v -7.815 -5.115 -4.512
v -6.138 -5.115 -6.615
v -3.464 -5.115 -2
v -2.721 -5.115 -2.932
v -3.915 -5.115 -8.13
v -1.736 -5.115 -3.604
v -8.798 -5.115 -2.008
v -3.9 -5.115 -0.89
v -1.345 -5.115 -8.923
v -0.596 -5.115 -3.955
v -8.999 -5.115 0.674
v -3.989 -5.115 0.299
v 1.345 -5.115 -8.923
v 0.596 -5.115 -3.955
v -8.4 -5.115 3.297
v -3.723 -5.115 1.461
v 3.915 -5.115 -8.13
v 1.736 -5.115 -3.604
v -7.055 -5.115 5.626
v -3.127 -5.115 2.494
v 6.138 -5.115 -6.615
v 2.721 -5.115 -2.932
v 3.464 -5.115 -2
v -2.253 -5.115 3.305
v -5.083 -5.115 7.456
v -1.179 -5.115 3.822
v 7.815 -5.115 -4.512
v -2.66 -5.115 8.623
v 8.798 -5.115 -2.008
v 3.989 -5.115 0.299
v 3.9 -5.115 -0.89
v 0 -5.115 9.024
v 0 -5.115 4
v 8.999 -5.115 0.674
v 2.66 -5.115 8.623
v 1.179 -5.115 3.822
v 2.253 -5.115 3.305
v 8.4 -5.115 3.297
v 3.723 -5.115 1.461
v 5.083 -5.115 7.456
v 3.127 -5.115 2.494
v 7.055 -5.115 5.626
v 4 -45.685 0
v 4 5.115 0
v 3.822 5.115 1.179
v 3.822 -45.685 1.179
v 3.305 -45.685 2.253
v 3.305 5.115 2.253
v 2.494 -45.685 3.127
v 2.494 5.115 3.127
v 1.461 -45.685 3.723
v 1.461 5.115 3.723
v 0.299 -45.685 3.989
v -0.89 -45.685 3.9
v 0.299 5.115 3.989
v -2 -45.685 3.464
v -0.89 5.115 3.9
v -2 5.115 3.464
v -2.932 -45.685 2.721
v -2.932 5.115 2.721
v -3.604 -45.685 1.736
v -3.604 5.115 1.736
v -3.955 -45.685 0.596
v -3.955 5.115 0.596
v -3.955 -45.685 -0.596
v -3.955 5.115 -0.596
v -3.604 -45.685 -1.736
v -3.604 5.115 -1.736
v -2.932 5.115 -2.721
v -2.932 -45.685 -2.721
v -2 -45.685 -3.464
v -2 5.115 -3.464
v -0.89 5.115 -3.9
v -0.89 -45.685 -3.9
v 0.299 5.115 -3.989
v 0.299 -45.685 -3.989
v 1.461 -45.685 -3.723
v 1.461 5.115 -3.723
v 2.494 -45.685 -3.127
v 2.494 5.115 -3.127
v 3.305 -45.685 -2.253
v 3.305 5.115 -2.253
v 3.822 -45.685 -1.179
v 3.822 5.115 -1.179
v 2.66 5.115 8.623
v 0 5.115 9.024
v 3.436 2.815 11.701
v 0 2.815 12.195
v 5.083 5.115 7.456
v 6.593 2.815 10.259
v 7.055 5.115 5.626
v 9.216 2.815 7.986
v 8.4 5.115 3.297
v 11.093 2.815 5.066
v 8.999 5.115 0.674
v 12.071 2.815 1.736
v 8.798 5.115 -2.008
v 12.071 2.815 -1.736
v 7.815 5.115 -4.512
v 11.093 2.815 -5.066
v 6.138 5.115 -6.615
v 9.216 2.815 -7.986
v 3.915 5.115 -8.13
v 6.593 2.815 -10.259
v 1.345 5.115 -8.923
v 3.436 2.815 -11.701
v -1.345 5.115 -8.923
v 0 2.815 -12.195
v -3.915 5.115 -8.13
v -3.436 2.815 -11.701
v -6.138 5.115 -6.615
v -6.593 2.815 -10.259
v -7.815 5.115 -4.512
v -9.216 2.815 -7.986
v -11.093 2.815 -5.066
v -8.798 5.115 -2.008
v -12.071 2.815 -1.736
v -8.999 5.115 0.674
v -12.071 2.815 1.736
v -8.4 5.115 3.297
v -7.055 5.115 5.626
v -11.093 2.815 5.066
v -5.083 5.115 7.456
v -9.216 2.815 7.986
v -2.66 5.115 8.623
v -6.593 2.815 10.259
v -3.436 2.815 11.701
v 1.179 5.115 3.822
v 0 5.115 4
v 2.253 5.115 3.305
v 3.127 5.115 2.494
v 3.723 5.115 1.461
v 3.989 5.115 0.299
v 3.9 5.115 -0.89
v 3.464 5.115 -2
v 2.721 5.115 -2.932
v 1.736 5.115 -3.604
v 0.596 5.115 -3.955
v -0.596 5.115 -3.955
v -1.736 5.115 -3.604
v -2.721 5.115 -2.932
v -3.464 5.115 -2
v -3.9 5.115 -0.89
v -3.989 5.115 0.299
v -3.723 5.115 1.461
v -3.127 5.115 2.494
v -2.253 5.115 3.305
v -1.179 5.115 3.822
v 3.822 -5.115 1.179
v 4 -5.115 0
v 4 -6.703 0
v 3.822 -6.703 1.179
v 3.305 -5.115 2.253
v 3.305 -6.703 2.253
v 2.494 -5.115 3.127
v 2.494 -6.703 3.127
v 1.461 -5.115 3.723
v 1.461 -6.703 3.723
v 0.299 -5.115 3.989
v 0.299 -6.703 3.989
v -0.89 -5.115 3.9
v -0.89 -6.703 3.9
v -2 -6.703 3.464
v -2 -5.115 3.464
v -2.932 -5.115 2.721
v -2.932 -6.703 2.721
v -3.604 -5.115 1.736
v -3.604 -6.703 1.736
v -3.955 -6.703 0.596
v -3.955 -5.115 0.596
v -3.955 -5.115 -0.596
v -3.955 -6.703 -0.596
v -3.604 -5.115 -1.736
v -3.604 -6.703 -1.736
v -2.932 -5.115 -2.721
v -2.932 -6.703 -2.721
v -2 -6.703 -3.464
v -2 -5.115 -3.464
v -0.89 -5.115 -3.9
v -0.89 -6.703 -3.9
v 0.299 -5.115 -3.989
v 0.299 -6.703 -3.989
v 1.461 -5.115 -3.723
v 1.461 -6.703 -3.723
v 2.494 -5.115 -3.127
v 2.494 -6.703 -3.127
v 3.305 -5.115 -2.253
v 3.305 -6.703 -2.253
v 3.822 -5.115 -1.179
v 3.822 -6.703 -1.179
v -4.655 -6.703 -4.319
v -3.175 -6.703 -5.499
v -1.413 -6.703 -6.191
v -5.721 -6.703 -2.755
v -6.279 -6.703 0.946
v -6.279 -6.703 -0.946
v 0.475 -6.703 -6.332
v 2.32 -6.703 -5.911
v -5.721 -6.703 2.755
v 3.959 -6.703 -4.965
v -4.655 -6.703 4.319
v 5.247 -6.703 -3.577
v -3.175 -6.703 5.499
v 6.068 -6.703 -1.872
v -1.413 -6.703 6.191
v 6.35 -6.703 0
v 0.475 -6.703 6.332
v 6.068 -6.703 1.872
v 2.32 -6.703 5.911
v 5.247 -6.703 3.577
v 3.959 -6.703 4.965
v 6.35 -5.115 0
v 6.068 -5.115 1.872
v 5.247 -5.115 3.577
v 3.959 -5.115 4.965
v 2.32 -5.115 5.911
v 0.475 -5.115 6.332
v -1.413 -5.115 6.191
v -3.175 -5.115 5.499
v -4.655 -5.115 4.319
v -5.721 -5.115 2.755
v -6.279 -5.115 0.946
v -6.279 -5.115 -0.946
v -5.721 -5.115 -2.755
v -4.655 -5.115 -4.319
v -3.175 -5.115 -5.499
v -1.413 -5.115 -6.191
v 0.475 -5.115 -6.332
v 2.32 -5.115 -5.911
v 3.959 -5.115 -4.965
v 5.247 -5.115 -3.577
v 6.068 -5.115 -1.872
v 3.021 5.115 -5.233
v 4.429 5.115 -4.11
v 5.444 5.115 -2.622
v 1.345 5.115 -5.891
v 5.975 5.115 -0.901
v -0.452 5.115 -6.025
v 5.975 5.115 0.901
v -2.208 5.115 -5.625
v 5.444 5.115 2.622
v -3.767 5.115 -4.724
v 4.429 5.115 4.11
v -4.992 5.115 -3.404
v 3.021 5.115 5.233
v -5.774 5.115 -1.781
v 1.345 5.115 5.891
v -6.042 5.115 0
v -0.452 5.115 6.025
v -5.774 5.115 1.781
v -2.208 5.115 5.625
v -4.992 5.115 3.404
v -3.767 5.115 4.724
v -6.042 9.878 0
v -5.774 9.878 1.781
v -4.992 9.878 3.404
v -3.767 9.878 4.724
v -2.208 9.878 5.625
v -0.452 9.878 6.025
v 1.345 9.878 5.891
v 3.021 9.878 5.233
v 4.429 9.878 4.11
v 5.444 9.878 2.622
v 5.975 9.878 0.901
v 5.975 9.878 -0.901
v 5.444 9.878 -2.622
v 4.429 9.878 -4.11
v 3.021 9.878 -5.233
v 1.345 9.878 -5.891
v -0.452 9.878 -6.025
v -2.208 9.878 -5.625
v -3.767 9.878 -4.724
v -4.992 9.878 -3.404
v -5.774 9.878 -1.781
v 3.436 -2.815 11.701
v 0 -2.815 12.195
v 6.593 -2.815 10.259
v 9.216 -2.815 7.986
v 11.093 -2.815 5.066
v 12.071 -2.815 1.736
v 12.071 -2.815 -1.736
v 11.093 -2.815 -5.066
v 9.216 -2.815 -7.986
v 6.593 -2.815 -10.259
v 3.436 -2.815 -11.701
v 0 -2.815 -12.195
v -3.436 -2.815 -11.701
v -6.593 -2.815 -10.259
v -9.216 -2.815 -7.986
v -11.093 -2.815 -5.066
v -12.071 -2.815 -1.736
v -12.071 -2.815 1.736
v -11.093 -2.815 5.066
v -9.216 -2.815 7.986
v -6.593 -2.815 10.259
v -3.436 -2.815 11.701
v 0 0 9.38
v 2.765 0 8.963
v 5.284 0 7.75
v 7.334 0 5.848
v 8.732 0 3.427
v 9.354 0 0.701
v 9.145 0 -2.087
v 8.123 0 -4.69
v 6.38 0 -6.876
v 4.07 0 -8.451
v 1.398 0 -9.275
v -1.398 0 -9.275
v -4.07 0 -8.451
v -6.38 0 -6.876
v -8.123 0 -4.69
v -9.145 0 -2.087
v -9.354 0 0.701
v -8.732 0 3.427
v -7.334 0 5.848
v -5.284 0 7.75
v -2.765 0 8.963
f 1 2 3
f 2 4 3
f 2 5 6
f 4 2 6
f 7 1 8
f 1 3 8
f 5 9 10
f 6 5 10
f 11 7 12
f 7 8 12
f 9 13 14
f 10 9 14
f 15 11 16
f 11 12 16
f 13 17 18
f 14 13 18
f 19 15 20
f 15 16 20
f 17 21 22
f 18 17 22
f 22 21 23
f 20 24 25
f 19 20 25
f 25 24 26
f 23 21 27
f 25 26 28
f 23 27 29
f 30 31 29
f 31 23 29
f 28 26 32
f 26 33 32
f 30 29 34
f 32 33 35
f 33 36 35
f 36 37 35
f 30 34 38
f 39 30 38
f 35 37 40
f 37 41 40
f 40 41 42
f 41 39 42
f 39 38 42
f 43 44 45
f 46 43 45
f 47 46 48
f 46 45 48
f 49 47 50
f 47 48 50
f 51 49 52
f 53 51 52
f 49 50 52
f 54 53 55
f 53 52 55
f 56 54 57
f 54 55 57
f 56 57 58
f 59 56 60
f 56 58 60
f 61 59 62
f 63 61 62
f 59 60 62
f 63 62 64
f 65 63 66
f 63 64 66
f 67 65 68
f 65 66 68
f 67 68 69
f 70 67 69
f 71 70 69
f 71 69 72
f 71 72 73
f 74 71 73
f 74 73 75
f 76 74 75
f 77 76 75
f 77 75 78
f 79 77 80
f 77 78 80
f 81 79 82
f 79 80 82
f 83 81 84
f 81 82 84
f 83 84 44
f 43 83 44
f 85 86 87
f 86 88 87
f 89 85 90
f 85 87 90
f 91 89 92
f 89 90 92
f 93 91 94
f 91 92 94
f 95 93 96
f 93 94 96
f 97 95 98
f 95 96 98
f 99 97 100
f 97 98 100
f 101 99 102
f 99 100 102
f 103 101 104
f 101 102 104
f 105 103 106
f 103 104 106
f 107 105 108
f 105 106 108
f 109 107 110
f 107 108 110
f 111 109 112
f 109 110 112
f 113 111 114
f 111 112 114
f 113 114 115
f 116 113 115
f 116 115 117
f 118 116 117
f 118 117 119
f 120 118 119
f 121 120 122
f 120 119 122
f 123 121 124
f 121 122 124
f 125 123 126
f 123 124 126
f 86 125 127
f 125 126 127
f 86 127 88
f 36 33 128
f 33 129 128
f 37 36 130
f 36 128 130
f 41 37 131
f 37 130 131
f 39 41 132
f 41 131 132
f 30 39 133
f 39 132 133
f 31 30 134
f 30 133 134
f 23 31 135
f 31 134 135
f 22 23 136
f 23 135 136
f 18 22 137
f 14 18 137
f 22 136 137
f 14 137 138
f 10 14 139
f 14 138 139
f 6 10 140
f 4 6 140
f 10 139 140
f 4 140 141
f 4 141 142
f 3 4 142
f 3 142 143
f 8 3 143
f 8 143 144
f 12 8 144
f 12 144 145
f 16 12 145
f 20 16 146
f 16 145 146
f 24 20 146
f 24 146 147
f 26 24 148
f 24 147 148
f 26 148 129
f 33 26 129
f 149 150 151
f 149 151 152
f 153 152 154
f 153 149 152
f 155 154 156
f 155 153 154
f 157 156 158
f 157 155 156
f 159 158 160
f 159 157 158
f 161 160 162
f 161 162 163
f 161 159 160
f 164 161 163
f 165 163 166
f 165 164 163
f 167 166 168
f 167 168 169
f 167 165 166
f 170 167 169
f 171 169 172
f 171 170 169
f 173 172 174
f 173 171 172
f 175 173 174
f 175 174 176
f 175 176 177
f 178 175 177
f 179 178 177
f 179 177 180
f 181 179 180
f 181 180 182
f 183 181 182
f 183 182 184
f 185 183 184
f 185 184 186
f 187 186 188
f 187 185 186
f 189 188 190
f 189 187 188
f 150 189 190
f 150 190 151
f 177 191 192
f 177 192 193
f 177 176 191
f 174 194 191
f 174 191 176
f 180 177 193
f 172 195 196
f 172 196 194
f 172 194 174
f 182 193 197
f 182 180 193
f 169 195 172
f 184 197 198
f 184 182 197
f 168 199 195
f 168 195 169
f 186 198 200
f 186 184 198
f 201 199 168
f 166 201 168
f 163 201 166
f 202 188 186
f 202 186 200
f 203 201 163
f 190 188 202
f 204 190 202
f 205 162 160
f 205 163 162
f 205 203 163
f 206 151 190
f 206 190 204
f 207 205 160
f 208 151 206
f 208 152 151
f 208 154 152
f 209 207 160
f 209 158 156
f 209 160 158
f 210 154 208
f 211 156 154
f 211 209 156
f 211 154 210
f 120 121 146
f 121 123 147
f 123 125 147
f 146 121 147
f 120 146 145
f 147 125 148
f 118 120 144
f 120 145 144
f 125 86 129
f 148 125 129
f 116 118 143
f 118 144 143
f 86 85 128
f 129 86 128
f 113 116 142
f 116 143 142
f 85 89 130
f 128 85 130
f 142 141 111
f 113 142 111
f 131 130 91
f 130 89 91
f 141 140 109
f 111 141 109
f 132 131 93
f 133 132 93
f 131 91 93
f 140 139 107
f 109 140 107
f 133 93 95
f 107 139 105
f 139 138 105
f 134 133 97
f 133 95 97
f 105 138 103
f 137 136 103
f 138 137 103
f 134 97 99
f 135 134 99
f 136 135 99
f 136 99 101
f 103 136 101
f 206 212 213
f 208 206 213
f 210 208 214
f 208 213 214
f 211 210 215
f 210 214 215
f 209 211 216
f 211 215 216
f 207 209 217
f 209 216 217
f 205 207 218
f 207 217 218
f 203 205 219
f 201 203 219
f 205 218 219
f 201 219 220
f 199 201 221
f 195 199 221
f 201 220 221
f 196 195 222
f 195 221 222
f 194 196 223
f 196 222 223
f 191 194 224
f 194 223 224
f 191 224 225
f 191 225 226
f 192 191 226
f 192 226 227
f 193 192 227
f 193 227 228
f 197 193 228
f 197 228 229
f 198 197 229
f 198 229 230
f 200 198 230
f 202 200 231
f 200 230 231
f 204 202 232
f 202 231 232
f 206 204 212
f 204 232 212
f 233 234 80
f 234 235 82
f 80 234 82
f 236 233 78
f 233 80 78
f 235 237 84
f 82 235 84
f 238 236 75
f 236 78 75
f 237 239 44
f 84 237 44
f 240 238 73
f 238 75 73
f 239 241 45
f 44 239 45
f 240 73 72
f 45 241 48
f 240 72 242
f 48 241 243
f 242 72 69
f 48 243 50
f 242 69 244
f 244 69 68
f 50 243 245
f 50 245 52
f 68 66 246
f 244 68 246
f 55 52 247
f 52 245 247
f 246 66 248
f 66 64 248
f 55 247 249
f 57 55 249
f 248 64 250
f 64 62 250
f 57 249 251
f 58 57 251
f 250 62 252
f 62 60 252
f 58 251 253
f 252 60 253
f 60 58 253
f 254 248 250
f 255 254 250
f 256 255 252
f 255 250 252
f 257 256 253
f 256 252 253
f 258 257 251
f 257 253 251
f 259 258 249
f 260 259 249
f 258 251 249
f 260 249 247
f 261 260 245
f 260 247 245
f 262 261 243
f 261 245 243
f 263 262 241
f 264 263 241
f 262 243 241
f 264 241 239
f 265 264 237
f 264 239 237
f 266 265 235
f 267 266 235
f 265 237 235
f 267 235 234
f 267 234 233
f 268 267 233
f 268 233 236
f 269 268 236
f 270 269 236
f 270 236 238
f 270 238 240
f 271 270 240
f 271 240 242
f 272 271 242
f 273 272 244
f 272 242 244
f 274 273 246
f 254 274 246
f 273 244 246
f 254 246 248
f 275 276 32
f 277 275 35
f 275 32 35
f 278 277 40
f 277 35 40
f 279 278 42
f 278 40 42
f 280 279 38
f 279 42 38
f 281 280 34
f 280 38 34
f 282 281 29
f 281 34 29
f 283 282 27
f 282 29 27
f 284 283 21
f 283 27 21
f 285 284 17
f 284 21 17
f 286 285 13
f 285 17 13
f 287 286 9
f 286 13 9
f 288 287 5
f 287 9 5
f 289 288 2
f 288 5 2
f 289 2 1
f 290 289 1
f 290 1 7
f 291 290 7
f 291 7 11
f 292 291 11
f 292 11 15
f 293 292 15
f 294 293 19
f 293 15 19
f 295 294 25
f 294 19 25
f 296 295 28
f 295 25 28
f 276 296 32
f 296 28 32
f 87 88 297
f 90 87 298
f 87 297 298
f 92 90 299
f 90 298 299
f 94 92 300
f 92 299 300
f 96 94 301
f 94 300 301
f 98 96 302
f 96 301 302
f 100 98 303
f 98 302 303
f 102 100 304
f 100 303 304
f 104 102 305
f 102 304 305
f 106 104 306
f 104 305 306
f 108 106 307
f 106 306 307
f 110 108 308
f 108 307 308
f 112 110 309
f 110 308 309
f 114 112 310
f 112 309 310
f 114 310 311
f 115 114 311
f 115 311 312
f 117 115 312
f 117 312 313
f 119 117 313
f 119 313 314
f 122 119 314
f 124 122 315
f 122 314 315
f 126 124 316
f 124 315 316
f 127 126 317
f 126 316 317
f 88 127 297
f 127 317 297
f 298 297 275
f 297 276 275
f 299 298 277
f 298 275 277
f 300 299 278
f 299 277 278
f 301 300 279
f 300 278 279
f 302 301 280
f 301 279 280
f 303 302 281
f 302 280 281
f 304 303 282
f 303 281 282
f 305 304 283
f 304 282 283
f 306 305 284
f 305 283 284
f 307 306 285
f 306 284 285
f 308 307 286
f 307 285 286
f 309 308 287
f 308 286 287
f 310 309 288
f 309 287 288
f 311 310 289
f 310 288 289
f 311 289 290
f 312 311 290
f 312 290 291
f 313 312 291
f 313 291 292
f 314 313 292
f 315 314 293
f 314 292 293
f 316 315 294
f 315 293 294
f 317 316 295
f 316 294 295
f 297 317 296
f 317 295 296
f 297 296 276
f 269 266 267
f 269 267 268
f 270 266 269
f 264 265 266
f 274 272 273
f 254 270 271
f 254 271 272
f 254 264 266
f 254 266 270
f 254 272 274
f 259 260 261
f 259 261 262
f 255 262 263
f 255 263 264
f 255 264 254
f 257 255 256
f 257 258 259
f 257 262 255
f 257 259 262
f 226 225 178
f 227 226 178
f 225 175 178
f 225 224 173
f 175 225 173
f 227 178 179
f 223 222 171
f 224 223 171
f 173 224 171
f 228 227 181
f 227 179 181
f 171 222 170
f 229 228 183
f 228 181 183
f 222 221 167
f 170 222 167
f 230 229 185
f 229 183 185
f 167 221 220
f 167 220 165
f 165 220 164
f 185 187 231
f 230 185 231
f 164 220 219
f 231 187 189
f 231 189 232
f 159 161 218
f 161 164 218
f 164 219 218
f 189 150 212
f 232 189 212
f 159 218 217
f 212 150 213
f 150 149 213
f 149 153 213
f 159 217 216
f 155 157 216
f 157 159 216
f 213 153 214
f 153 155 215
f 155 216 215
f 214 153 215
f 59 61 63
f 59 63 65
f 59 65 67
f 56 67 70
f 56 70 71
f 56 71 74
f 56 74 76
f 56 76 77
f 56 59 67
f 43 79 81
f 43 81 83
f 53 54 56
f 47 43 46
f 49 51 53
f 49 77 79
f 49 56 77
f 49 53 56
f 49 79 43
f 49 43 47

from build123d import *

# Parameters (mm, degrees)
F2_R     = 6.35
F2_R_2   = 4
F3_DEPTH = 1.5875
F4_R     = 6.0423658591
F5_DEPTH = 4.7625
F6_R     = 4
F7_DEPTH = 50.8


with BuildPart() as f1:
    # F0 (on Right) → F1 (revolve)
    with BuildSketch(Plane.YZ):
        Polygon((-5.115, 9.0238079429), (-5.115, 4), (5.115, 4), (5.115, 9.0238079429), (2.815, 12.195), (0, 9.38), (-2.815, 12.195), align=None)
    revolve(axis=Axis((0, -0.9241095702, 0), (0, 1, 0)))


with BuildPart() as f3:
    # F2 (on face) → F3 (new body)
    with BuildSketch(Plane.XZ.offset(5.115)):
        Circle(F2_R)
        Circle(F2_R_2, mode=Mode.SUBTRACT)
    extrude(amount=F3_DEPTH)


with BuildPart() as f5:
    # F4 (on face) → F5 (new body)
    with BuildSketch(Plane(origin=(0, 5.115, 0), x_dir=(-1, 0, 0), z_dir=(0, 1, 0))):
        Circle(F4_R)
    extrude(amount=F5_DEPTH)

    # F6 (on face) → F7 (join)
    with BuildSketch(Plane.XZ.offset(-5.115)):
        Circle(F6_R)
    extrude(amount=F7_DEPTH)


solid = Compound([f1.part, f3.part, f5.part])
